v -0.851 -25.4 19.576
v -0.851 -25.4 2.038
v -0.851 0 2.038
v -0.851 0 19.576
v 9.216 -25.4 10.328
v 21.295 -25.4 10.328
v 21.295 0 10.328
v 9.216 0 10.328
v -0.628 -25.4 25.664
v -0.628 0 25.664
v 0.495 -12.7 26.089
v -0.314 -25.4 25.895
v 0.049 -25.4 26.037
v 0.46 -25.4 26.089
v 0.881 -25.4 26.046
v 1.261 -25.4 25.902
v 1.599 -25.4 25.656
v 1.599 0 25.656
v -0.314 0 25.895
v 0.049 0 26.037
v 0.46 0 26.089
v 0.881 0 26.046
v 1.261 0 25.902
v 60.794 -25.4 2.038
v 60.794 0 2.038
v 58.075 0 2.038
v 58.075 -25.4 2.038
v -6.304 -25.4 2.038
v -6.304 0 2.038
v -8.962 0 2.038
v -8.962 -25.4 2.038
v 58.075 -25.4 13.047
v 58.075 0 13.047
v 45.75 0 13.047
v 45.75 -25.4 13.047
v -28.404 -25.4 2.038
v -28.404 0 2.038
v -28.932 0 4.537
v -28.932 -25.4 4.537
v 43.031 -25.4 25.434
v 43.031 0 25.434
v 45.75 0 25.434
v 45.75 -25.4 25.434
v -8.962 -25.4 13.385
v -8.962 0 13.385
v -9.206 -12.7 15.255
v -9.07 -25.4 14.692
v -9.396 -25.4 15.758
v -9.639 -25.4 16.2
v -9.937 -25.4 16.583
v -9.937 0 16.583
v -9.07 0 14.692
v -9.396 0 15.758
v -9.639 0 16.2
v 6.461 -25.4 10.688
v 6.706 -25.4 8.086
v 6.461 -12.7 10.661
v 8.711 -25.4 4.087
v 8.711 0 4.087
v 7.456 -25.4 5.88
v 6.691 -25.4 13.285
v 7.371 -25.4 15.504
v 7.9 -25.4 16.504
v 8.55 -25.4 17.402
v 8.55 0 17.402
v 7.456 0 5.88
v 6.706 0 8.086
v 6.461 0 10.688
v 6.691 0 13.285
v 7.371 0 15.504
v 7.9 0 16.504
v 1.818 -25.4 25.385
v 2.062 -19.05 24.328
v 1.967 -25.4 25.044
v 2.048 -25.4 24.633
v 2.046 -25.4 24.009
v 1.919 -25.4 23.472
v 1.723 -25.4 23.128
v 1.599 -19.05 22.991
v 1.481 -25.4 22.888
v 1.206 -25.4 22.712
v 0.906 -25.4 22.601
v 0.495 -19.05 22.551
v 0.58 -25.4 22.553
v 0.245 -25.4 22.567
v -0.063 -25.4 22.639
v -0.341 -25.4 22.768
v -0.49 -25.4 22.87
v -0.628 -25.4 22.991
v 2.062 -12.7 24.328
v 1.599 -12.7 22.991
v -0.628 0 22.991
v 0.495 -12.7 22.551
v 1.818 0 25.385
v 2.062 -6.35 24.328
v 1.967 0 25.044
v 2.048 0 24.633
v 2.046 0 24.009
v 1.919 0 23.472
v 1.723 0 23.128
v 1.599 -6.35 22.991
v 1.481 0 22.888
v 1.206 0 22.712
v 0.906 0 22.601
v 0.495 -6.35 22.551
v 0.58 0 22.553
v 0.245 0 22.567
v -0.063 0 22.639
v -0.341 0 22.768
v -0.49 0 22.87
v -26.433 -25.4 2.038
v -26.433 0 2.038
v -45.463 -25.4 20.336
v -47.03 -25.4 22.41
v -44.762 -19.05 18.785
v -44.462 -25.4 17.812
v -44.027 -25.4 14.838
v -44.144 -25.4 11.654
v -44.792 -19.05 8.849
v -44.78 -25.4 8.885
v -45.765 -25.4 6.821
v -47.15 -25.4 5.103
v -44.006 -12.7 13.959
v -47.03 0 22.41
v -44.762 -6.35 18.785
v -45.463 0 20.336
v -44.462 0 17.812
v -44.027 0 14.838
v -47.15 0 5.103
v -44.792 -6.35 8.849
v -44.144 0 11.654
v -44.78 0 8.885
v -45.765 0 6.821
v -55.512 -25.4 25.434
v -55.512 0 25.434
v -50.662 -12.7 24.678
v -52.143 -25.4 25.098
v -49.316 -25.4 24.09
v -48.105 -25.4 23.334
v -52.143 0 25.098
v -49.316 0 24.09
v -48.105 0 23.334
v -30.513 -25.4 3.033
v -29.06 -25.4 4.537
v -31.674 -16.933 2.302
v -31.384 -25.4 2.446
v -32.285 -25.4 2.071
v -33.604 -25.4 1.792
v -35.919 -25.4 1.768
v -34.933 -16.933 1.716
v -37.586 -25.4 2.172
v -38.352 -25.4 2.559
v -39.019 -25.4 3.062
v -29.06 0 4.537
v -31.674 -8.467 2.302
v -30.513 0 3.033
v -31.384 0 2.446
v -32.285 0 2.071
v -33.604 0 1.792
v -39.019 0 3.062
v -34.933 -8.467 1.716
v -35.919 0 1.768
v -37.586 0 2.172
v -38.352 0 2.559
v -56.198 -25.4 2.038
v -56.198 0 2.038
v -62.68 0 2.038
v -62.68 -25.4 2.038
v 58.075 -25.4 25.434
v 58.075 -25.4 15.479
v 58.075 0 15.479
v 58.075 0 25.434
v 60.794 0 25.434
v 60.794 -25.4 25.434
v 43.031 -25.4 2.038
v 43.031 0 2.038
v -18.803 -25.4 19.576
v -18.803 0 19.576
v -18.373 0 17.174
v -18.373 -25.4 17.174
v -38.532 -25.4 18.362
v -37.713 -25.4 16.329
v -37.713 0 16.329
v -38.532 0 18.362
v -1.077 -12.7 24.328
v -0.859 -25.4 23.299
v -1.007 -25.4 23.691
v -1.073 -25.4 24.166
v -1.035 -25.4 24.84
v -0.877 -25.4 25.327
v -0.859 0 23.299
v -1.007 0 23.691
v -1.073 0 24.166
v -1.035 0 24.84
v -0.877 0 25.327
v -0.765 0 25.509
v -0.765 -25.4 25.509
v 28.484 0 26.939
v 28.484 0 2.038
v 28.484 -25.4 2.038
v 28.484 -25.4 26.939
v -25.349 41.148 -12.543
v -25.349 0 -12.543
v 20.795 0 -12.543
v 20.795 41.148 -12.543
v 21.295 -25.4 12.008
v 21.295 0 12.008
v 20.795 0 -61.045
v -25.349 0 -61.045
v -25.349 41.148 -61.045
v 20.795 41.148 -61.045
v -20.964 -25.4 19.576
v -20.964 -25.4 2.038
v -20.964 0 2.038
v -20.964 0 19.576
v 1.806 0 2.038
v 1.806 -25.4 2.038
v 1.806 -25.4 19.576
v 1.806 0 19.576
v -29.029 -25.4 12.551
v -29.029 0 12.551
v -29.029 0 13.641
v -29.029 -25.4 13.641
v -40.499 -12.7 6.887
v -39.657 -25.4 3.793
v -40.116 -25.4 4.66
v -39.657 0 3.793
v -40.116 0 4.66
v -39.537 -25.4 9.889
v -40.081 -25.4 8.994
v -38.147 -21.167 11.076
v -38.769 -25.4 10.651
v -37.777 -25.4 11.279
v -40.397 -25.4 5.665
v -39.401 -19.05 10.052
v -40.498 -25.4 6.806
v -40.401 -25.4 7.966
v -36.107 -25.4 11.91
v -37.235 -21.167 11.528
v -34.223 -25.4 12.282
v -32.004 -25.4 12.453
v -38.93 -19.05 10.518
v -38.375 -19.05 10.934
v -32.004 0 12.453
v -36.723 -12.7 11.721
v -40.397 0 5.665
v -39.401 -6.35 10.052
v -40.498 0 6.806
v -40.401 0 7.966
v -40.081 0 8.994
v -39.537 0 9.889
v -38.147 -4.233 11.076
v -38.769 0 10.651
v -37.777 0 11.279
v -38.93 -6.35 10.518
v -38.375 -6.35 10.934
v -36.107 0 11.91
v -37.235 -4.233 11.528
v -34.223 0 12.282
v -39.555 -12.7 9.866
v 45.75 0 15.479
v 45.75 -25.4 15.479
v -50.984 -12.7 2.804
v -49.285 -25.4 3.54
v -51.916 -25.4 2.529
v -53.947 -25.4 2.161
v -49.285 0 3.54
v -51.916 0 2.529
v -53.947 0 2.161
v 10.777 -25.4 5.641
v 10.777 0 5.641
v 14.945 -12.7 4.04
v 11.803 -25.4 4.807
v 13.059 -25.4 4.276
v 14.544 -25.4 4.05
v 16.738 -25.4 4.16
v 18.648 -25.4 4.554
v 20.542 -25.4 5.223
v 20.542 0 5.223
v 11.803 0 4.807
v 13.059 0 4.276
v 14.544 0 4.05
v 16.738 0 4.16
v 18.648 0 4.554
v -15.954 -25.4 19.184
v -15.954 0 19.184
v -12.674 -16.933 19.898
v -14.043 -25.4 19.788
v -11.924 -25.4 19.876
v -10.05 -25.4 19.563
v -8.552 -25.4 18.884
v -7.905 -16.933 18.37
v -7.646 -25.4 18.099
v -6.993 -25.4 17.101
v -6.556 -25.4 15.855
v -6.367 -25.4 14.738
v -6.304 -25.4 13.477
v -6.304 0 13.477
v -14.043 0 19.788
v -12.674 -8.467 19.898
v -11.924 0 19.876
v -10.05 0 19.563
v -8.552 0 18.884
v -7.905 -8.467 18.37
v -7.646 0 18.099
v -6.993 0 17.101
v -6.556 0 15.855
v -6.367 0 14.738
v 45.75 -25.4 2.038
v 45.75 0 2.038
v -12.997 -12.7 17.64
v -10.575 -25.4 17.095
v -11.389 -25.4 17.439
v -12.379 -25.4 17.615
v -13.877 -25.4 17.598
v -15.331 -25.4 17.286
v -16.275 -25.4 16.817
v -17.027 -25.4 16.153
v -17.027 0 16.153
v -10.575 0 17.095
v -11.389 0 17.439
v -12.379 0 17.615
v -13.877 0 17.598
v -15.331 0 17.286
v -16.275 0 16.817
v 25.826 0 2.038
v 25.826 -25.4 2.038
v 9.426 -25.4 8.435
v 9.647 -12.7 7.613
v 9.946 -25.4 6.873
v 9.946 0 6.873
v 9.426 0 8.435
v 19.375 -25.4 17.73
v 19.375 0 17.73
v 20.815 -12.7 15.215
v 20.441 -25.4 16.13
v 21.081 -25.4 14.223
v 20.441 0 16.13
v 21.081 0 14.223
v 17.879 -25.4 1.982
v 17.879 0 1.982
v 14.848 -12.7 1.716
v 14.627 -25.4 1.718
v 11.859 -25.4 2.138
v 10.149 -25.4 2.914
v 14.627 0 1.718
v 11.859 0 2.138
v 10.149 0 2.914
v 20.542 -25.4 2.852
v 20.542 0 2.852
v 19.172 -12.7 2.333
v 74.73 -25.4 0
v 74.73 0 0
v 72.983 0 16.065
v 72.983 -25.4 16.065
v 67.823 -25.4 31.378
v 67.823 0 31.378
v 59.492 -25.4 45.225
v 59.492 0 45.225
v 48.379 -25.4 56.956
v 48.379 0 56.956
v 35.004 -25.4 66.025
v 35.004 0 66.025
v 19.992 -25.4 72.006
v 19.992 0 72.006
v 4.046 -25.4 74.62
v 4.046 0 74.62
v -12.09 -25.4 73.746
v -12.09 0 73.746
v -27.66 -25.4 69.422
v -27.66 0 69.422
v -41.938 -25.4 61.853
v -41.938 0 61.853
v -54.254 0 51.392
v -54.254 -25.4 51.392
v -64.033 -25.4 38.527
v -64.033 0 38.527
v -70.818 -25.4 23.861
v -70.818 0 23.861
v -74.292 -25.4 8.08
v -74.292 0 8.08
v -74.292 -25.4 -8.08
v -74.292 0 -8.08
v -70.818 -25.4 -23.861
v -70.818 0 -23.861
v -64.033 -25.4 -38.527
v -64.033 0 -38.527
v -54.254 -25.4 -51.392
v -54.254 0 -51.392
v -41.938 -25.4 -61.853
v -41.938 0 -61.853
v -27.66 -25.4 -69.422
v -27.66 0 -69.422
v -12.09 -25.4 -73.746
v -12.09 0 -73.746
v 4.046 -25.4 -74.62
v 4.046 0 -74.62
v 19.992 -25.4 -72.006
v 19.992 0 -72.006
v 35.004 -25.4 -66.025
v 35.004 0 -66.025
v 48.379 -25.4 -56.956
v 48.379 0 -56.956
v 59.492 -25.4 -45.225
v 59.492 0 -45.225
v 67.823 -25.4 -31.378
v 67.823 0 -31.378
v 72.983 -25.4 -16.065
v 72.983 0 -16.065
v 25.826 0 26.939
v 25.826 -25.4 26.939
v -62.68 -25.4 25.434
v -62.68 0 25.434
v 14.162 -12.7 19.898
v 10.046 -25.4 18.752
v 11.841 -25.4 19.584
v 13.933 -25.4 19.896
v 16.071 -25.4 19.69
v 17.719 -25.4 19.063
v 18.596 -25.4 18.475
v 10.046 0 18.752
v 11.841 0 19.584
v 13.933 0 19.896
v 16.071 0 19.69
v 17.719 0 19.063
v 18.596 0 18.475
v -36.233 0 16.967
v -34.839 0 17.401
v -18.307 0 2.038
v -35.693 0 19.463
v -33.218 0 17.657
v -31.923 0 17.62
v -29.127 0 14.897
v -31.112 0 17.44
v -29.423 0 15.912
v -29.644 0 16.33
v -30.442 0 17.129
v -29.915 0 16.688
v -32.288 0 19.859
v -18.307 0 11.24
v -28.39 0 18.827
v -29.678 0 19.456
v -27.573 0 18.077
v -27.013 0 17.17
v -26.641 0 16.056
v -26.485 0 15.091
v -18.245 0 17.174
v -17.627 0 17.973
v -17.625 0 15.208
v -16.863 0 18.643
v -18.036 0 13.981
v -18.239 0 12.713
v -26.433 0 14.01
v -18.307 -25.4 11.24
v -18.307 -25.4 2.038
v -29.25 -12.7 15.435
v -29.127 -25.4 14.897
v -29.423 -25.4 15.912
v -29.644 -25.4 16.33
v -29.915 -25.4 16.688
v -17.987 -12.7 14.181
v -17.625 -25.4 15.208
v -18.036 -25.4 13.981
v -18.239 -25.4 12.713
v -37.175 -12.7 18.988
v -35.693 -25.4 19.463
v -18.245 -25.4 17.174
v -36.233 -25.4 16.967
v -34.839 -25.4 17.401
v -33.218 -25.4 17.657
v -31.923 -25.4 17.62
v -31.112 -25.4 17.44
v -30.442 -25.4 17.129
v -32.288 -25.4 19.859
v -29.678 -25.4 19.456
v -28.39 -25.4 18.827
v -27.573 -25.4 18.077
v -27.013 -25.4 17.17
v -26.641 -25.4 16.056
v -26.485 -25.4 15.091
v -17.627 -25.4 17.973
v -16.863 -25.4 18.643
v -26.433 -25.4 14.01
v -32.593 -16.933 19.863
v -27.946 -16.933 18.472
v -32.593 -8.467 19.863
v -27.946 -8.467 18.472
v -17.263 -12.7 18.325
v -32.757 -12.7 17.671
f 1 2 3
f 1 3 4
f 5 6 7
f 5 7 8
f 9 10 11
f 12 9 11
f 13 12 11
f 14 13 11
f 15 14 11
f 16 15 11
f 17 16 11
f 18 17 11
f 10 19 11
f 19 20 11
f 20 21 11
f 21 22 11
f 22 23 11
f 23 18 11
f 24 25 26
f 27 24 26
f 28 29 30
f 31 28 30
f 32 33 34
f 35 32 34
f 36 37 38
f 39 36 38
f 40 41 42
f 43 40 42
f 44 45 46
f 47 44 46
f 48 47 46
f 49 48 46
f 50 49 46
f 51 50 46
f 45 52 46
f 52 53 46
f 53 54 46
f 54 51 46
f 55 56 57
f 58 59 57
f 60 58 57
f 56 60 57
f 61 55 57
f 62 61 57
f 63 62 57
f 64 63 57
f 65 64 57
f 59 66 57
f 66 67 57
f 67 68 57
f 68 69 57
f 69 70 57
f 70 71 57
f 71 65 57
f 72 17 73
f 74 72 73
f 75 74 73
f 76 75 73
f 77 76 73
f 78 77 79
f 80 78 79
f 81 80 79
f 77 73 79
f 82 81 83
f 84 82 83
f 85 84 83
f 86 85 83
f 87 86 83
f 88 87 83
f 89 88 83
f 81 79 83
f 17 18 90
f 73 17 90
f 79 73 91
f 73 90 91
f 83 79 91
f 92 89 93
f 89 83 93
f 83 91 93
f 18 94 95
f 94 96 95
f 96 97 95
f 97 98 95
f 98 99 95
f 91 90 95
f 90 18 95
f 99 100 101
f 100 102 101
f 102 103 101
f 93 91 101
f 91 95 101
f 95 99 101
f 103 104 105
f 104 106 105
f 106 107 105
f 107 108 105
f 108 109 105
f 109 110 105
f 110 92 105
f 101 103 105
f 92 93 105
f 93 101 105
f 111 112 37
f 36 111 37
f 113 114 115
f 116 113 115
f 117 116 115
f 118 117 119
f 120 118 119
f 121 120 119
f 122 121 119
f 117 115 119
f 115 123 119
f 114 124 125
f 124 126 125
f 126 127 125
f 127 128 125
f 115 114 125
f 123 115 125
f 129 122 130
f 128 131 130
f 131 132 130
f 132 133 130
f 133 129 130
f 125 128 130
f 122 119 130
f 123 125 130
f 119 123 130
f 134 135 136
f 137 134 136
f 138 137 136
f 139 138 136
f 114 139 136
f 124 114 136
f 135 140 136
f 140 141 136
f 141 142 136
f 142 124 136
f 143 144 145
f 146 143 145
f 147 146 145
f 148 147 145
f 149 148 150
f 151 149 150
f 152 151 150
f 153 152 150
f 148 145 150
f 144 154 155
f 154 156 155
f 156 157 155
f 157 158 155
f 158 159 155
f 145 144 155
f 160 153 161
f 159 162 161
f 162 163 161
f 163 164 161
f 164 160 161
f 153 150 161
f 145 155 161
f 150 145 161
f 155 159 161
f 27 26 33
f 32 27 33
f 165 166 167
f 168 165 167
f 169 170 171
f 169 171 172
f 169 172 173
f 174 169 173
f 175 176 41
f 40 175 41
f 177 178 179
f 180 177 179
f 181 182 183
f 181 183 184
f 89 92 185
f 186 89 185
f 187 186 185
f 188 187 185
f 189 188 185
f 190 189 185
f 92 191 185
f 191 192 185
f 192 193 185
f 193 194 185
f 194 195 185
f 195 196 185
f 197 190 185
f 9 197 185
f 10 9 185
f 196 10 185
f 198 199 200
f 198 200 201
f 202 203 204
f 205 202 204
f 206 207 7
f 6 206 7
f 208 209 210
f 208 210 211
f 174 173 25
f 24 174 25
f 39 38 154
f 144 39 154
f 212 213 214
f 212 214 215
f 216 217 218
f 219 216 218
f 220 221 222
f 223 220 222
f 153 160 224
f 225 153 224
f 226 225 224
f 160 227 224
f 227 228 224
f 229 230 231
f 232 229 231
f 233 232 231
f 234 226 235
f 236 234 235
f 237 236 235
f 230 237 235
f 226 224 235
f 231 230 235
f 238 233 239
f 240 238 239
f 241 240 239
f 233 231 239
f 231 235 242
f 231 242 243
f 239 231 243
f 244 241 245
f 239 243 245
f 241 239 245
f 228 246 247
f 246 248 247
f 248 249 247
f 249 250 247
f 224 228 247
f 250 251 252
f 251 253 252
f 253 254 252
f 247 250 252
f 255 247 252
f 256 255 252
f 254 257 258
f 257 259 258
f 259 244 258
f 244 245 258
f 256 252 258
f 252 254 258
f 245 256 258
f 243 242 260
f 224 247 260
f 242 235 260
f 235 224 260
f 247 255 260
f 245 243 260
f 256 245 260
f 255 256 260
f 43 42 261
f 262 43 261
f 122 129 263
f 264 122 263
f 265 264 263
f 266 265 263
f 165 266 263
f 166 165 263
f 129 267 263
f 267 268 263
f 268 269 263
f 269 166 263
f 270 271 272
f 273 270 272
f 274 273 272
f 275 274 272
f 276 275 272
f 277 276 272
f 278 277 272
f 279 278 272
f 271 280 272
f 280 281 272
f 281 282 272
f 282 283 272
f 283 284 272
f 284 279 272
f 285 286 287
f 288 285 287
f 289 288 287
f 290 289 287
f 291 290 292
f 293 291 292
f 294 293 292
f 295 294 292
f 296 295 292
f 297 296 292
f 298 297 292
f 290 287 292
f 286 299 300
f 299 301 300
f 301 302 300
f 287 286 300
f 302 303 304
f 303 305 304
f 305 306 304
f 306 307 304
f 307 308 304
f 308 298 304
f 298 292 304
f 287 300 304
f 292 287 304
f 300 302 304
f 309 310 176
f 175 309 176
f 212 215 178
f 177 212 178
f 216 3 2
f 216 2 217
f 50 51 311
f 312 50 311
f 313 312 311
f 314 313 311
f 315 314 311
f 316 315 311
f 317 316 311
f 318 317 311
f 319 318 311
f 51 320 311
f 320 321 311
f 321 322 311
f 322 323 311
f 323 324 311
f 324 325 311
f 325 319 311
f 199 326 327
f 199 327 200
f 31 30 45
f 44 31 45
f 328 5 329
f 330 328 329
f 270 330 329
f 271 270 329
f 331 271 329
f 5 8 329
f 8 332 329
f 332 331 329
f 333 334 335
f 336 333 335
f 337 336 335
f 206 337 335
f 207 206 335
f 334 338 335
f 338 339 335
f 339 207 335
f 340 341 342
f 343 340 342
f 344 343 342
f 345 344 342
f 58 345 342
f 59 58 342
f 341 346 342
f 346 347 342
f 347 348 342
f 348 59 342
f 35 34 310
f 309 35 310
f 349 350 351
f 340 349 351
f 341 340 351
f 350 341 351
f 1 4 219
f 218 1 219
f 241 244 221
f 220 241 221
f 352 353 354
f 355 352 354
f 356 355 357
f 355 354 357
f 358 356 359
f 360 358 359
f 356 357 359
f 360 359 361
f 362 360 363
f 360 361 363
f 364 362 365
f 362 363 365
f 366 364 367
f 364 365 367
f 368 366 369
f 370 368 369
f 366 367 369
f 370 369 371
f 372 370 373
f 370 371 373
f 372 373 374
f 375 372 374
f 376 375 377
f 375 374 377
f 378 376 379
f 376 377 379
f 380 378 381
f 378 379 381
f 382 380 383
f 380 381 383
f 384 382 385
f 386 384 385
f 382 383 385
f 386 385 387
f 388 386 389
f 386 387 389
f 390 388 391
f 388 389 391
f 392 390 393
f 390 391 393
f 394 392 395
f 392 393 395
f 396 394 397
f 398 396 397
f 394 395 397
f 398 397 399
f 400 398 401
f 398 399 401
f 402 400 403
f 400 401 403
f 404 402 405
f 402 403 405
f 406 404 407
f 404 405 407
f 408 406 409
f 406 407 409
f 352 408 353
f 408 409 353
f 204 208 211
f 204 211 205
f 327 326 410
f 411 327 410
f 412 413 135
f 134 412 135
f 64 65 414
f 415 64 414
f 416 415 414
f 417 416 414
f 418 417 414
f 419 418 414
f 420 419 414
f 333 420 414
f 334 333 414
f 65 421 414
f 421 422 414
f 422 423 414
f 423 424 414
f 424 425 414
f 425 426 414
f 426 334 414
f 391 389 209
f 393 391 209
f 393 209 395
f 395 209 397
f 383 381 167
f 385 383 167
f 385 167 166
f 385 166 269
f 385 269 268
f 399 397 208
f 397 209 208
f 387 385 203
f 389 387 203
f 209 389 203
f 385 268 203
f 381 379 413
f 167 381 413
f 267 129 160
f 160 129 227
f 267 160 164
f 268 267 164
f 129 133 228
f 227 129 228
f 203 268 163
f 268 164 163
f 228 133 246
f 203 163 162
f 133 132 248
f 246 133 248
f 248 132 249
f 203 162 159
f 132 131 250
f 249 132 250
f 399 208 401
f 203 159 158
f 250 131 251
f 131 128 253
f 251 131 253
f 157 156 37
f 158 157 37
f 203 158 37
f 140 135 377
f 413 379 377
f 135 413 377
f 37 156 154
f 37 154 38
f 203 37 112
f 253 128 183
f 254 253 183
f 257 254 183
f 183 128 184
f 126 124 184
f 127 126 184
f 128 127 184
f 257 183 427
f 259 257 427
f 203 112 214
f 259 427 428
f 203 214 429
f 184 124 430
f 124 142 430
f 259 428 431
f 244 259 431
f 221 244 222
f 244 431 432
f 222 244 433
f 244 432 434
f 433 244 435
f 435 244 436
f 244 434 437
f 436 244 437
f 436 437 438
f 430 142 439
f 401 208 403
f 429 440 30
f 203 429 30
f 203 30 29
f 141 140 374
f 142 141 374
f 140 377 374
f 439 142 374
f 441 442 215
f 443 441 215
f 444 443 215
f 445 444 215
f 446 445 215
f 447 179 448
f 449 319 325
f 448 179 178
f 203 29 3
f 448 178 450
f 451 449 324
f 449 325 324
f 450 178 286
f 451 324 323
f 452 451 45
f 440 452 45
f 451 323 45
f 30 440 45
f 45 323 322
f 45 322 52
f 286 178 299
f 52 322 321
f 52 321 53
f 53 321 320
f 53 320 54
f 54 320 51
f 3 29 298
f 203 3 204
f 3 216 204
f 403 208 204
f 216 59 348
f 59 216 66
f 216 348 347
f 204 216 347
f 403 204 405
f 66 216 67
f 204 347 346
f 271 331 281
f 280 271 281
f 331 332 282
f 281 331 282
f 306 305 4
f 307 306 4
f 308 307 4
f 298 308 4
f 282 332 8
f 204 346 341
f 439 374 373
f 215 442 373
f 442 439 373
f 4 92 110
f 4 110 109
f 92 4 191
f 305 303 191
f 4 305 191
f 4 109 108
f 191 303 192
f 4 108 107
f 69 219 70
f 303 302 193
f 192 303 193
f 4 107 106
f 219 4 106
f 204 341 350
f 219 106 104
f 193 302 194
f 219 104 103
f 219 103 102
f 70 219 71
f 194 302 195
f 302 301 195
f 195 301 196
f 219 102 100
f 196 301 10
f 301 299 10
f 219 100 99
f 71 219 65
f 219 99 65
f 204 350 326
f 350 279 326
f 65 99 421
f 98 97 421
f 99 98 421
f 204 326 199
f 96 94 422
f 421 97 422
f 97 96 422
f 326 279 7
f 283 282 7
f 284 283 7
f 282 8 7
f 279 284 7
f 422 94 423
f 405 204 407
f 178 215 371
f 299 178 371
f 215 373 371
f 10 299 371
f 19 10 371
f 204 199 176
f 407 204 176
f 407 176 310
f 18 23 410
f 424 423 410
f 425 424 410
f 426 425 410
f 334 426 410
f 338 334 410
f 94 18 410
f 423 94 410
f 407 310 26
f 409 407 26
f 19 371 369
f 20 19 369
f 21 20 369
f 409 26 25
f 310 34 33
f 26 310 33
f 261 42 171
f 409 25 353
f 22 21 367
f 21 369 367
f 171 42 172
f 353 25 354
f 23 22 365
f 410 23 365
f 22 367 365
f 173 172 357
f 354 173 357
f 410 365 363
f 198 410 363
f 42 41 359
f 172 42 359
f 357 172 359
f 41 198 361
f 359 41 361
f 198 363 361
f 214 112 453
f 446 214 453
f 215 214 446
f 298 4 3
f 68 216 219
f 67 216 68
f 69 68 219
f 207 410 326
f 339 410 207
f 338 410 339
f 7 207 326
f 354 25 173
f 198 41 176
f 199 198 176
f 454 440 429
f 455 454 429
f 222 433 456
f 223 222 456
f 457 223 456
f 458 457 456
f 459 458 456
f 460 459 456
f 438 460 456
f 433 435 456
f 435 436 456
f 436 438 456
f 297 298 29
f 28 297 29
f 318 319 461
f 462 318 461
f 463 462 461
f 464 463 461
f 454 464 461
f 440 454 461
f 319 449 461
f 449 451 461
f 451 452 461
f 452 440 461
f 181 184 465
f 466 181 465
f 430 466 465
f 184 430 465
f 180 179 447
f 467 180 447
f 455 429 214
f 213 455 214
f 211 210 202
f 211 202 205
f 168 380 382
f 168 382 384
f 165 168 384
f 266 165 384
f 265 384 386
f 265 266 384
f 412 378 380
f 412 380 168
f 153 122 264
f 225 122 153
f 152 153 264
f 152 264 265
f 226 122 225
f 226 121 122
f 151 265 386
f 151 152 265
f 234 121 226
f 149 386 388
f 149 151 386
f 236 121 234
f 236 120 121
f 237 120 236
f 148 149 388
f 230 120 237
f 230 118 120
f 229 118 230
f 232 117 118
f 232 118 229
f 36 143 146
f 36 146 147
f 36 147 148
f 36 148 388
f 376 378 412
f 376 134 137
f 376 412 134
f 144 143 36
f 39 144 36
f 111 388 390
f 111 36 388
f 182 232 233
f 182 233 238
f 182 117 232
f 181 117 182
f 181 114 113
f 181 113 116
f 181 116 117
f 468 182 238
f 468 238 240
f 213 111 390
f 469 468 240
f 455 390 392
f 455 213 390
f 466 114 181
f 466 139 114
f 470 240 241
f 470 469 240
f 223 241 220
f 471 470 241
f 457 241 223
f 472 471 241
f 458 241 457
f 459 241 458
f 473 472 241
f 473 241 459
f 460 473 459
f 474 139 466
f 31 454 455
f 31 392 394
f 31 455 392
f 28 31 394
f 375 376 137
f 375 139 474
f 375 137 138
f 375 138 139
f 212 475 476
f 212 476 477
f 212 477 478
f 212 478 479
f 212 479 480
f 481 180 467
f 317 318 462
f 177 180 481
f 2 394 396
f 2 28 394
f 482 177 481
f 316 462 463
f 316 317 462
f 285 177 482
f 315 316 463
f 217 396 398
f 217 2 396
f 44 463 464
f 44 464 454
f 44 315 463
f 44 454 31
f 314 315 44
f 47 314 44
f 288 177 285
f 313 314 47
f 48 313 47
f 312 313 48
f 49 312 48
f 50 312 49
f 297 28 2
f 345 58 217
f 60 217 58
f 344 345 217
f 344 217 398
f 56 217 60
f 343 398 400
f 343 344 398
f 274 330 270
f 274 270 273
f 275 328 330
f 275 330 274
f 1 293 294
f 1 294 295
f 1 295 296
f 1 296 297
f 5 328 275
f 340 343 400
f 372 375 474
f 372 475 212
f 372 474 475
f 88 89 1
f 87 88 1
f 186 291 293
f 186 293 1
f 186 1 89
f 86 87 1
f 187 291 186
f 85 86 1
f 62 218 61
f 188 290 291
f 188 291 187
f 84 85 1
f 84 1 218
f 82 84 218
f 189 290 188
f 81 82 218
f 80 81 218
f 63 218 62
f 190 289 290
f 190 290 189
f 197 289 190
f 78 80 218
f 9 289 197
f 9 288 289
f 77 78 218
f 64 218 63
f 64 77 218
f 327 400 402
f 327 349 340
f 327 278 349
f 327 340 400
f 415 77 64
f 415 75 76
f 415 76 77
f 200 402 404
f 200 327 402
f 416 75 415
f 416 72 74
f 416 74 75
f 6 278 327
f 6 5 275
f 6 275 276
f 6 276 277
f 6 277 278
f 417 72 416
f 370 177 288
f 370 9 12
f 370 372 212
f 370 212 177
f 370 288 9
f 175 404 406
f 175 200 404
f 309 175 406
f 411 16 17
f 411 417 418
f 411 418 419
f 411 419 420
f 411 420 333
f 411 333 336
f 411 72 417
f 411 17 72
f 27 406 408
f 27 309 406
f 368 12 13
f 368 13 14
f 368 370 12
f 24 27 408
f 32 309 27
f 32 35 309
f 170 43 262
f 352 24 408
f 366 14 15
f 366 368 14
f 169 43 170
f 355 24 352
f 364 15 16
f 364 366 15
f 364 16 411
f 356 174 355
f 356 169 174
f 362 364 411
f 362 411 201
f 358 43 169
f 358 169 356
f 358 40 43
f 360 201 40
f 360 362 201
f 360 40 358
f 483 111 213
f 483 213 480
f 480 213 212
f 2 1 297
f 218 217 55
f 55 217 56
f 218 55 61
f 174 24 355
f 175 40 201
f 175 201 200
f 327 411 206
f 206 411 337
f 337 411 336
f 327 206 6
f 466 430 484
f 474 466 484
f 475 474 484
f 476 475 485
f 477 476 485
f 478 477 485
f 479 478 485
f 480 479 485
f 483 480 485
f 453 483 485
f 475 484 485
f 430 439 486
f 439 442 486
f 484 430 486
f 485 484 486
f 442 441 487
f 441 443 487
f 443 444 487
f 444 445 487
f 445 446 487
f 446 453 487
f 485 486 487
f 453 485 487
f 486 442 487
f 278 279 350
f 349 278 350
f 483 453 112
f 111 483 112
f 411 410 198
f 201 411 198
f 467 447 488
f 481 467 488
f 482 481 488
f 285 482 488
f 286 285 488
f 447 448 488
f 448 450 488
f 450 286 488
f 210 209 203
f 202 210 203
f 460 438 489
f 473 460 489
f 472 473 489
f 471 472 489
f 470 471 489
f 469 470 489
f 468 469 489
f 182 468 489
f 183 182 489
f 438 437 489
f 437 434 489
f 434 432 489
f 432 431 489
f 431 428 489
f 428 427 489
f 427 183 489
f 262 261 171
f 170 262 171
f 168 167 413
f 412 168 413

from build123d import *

# Parameters (mm, degrees)
F0_R     = 74.7300726791
F0_W     = 2.6575055344
F0_H     = 17.5374883535
F0_H_2   = 24.9006732447
F2_DEPTH = 25.4
F1_W     = 46.1440682411
F1_H     = 48.5022477806
F3_DEPTH = 41.148


with BuildPart() as f2:
    # F0 (on Front) → F2 (new body)
    with BuildSketch(Plane.XZ):
        Circle(F0_R)
        with BuildLine():
            add(Edge.make_bspline(
                [(-47.0298489993, 22.4099815138), (-44.0062323942, 19.3863649086), (-44.0062323942, 13.9587042795)],
                knots=[0, 0, 0, 1, 1, 1], degree=2))
            add(Edge.make_bspline(
                [(-44.0062323942, 13.9587042795), (-44.0062323942, 8.1674927969), (-47.1501792114, 5.1029127153)],
                knots=[0, 0, 0, 1, 1, 1], degree=2))
            add(Edge.make_bspline(
                [(-47.1501792114, 5.1029127153), (-50.2941260287, 2.0383326337), (-56.1979870715, 2.0383326337)],
                knots=[0, 0, 0, 1, 1, 1], degree=2))
            Line((-56.1979870715, 2.0383326337), (-62.6804572191, 2.0383326337))
            Line((-62.6804572191, 2.0383326337), (-62.6804572191, 25.433598119))
            Line((-62.6804572191, 25.433598119), (-55.511848841, 25.433598119))
            add(Edge.make_bspline(
                [(-55.511848841, 25.433598119), (-50.0534656045, 25.433598119), (-47.0298489993, 22.4099815138)],
                knots=[0, 0, 0, 1, 1, 1], degree=2))
        make_face(mode=Mode.SUBTRACT)
        with BuildLine():
            Line((-26.4329009988, 2.0383326337), (-28.4042683027, 2.0383326337))
            Line((-28.4042683027, 2.0383326337), (-28.931673062, 4.5371046969))
            Line((-28.931673062, 4.5371046969), (-29.0596839259, 4.5371046969))
            add(Edge.make_bspline(
                [(-29.0596839259, 4.5371046969), (-30.3705151722, 2.8883247699), (-31.6736657666, 2.3020350133)],
                knots=[0, 0, 0, 1, 1, 1], degree=2))
            add(Edge.make_bspline(
                [(-31.6736657666, 2.3020350133), (-32.976816361, 1.7157452567), (-34.9328223613, 1.7157452567)],
                knots=[0, 0, 0, 1, 1, 1], degree=2))
            add(Edge.make_bspline(
                [(-34.9328223613, 1.7157452567), (-37.5391235502, 1.7157452567), (-39.0189291368, 3.0624195448)],
                knots=[0, 0, 0, 1, 1, 1], degree=2))
            add(Edge.make_bspline(
                [(-39.0189291368, 3.0624195448), (-40.4987347235, 4.409093833), (-40.4987347235, 6.887384158)],
                knots=[0, 0, 0, 1, 1, 1], degree=2))
            add(Edge.make_bspline(
                [(-40.4987347235, 6.887384158), (-40.4987347235, 12.1972747923), (-32.0039337954, 12.4532965201)],
                knots=[0, 0, 0, 1, 1, 1], degree=2))
            Line((-32.0039337954, 12.4532965201), (-29.0289613185, 12.5505847767))
            Line((-29.0289613185, 12.5505847767), (-29.0289613185, 13.641237337))
            add(Edge.make_bspline(
                [(-29.0289613185, 13.641237337), (-29.0289613185, 15.704772463), (-29.9147964967, 16.6878958977)],
                knots=[0, 0, 0, 1, 1, 1], degree=2))
            add(Edge.make_bspline(
                [(-29.9147964967, 16.6878958977), (-30.8006316748, 17.6710193324), (-32.7566376751, 17.6710193324)],
                knots=[0, 0, 0, 1, 1, 1], degree=2))
            add(Edge.make_bspline(
                [(-32.7566376751, 17.6710193324), (-34.948183665, 17.6710193324), (-37.7132183251, 16.3294654788)],
                knots=[0, 0, 0, 1, 1, 1], degree=2))
            Line((-37.7132183251, 16.3294654788), (-38.5324878541, 18.3622779975))
            add(Edge.make_bspline(
                [(-38.5324878541, 18.3622779975), (-37.2370179114, 19.0637775316), (-35.6932068929, 19.463171427)],
                knots=[0, 0, 0, 1, 1, 1], degree=2))
            add(Edge.make_bspline(
                [(-35.6932068929, 19.463171427), (-34.1493958743, 19.8625653223), (-32.5927837694, 19.8625653223)],
                knots=[0, 0, 0, 1, 1, 1], degree=2))
            add(Edge.make_bspline(
                [(-32.5927837694, 19.8625653223), (-29.4590778212, 19.8625653223), (-27.94598941, 18.4723673404)],
                knots=[0, 0, 0, 1, 1, 1], degree=2))
            add(Edge.make_bspline(
                [(-27.94598941, 18.4723673404), (-26.4329009988, 17.0821693585), (-26.4329009988, 14.0099086251)],
                knots=[0, 0, 0, 1, 1, 1], degree=2))
            Line((-26.4329009988, 14.0099086251), (-26.4329009988, 2.0383326337))
        make_face(mode=Mode.SUBTRACT)
        with BuildLine():
            Line((-6.30447276, 2.0383326337), (-8.9619782945, 2.0383326337))
            Line((-8.9619782945, 2.0383326337), (-8.9619782945, 13.3852156093))
            add(Edge.make_bspline(
                [(-8.9619782945, 13.3852156093), (-8.9619782945, 15.5255572536), (-9.9374210774, 16.5829269893)],
                knots=[0, 0, 0, 1, 1, 1], degree=2))
            add(Edge.make_bspline(
                [(-9.9374210774, 16.5829269893), (-10.9128638602, 17.6402967251), (-12.9968807244, 17.6402967251)],
                knots=[0, 0, 0, 1, 1, 1], degree=2))
            add(Edge.make_bspline(
                [(-12.9968807244, 17.6402967251), (-15.7465540809, 17.6402967251), (-17.0266627198, 16.1528104866)],
                knots=[0, 0, 0, 1, 1, 1], degree=2))
            add(Edge.make_bspline(
                [(-17.0266627198, 16.1528104866), (-18.3067713588, 14.6653242482), (-18.3067713588, 11.2397535304)],
                knots=[0, 0, 0, 1, 1, 1], degree=2))
            Line((-18.3067713588, 11.2397535304), (-18.3067713588, 2.0383326337))
            Line((-18.3067713588, 2.0383326337), (-20.9642768932, 2.0383326337))
            Line((-20.9642768932, 2.0383326337), (-20.9642768932, 19.5758209872))
            Line((-20.9642768932, 19.5758209872), (-18.8034535107, 19.5758209872))
            Line((-18.8034535107, 19.5758209872), (-18.373337008, 17.1743371805))
            Line((-18.373337008, 17.1743371805), (-18.2453261441, 17.1743371805))
            add(Edge.make_bspline(
                [(-18.2453261441, 17.1743371805), (-17.4260566152, 18.4698071231), (-15.9539316804, 19.1841077437)],
                knots=[0, 0, 0, 1, 1, 1], degree=2))
            add(Edge.make_bspline(
                [(-15.9539316804, 19.1841077437), (-14.4818067456, 19.8984083642), (-12.6742933474, 19.8984083642)],
                knots=[0, 0, 0, 1, 1, 1], degree=2))
            add(Edge.make_bspline(
                [(-12.6742933474, 19.8984083642), (-9.5047443574, 19.8984083642), (-7.9046085587, 18.3699586493)],
                knots=[0, 0, 0, 1, 1, 1], degree=2))
            add(Edge.make_bspline(
                [(-7.9046085587, 18.3699586493), (-6.30447276, 16.8415089344), (-6.30447276, 13.4773834313)],
                knots=[0, 0, 0, 1, 1, 1], degree=2))
            Line((-6.30447276, 13.4773834313), (-6.30447276, 2.0383326337))
        make_face(mode=Mode.SUBTRACT)
        with Locations((0.4775428091, 10.8070768104)):
            Rectangle(F0_W, F0_H, mode=Mode.SUBTRACT)
        with BuildLine():
            add(Edge.make_bspline(
                [(17.8793396468, 1.9820078536), (16.6248331807, 1.7157452567), (14.8480423898, 1.7157452567)],
                knots=[0, 0, 0, 1, 1, 1], degree=2))
            add(Edge.make_bspline(
                [(14.8480423898, 1.7157452567), (10.961632562, 1.7157452567), (8.7112015747, 4.086506456)],
                knots=[0, 0, 0, 1, 1, 1], degree=2))
            add(Edge.make_bspline(
                [(8.7112015747, 4.086506456), (6.4607705875, 6.4572676553), (6.4607705875, 10.6611444256)],
                knots=[0, 0, 0, 1, 1, 1], degree=2))
            add(Edge.make_bspline(
                [(6.4607705875, 10.6611444256), (6.4607705875, 14.9059846723), (8.5499078862, 17.4021965183)],
                knots=[0, 0, 0, 1, 1, 1], degree=2))
            add(Edge.make_bspline(
                [(8.5499078862, 17.4021965183), (10.639045185, 19.8984083642), (14.1619041594, 19.8984083642)],
                knots=[0, 0, 0, 1, 1, 1], degree=2))
            add(Edge.make_bspline(
                [(14.1619041594, 19.8984083642), (17.4543435787, 19.8984083642), (19.3745065371, 17.7299043298)],
                knots=[0, 0, 0, 1, 1, 1], degree=2))
            add(Edge.make_bspline(
                [(19.3745065371, 17.7299043298), (21.2946694955, 15.5614002955), (21.2946694955, 12.0078187138)],
                knots=[0, 0, 0, 1, 1, 1], degree=2))
            Line((21.2946694955, 12.0078187138), (21.2946694955, 10.3283161795))
            Line((21.2946694955, 10.3283161795), (9.2155643785, 10.3283161795))
            add(Edge.make_bspline(
                [(9.2155643785, 10.3283161795), (9.2974913314, 7.2406941423), (10.777296918, 5.6405583437)],
                knots=[0, 0, 0, 1, 1, 1], degree=2))
            add(Edge.make_bspline(
                [(10.777296918, 5.6405583437), (12.2571025046, 4.040422545), (14.9453306464, 4.040422545)],
                knots=[0, 0, 0, 1, 1, 1], degree=2))
            add(Edge.make_bspline(
                [(14.9453306464, 4.040422545), (17.7769309557, 4.040422545), (20.5419656158, 5.2232429274)],
                knots=[0, 0, 0, 1, 1, 1], degree=2))
            Line((20.5419656158, 5.2232429274), (20.5419656158, 2.852481728))
            add(Edge.make_bspline(
                [(20.5419656158, 2.852481728), (19.133846113, 2.2482704505), (17.8793396468, 1.9820078536)],
                knots=[0, 0, 0, 1, 1, 1], degree=2))
        make_face(mode=Mode.SUBTRACT)
        with Locations((27.1550068446, 14.488669256)):
            Rectangle(F0_W, F0_H_2, mode=Mode.SUBTRACT)
        with BuildLine():
            add(Edge.make_bspline(
                [(-0.628471055, 22.9911508359), (-1.0765090786, 23.4315082077), (-1.0765090786, 24.3275842549)],
                knots=[0, 0, 0, 1, 1, 1], degree=2))
            add(Edge.make_bspline(
                [(-1.0765090786, 24.3275842549), (-1.0765090786, 25.2390216059), (-0.628471055, 25.664017674)],
                knots=[0, 0, 0, 1, 1, 1], degree=2))
            add(Edge.make_bspline(
                [(-0.628471055, 25.664017674), (-0.1804330313, 26.0890137421), (0.49546433, 26.0890137421)],
                knots=[0, 0, 0, 1, 1, 1], degree=2))
            add(Edge.make_bspline(
                [(0.49546433, 26.0890137421), (1.1355186495, 26.0890137421), (1.5989179768, 25.6563370222)],
                knots=[0, 0, 0, 1, 1, 1], degree=2))
            add(Edge.make_bspline(
                [(1.5989179768, 25.6563370222), (2.0623173041, 25.2236603022), (2.0623173041, 24.3275842549)],
                knots=[0, 0, 0, 1, 1, 1], degree=2))
            add(Edge.make_bspline(
                [(2.0623173041, 24.3275842549), (2.0623173041, 23.4315082077), (1.5989179768, 22.9911508359)],
                knots=[0, 0, 0, 1, 1, 1], degree=2))
            add(Edge.make_bspline(
                [(1.5989179768, 22.9911508359), (1.1355186495, 22.5507934641), (0.49546433, 22.5507934641)],
                knots=[0, 0, 0, 1, 1, 1], degree=2))
            add(Edge.make_bspline(
                [(0.49546433, 22.5507934641), (-0.1804330313, 22.5507934641), (-0.628471055, 22.9911508359)],
                knots=[0, 0, 0, 1, 1, 1], degree=2))
        make_face(mode=Mode.SUBTRACT)
        Polygon((60.7937016587, 25.433598119), (60.7937016587, 2.0383326337), (58.0747509096, 2.0383326337), (58.0747509096, 13.0472669286), (45.7498649339, 13.0472669286), (45.7498649339, 2.0383326337), (43.0309141848, 2.0383326337), (43.0309141848, 25.433598119), (45.7498649339, 25.433598119), (45.7498649339, 15.4794733426), (58.0747509096, 15.4794733426), (58.0747509096, 25.433598119), align=None, mode=Mode.SUBTRACT)
    extrude(amount=F2_DEPTH)

    # F1 (on face) → F3 (join)
    with BuildSketch(Plane.XZ):
        with Locations((-2.2770911455, -36.7938820273)):
            Rectangle(F1_W, F1_H)
    extrude(amount=-F3_DEPTH)


solid = f2.part
